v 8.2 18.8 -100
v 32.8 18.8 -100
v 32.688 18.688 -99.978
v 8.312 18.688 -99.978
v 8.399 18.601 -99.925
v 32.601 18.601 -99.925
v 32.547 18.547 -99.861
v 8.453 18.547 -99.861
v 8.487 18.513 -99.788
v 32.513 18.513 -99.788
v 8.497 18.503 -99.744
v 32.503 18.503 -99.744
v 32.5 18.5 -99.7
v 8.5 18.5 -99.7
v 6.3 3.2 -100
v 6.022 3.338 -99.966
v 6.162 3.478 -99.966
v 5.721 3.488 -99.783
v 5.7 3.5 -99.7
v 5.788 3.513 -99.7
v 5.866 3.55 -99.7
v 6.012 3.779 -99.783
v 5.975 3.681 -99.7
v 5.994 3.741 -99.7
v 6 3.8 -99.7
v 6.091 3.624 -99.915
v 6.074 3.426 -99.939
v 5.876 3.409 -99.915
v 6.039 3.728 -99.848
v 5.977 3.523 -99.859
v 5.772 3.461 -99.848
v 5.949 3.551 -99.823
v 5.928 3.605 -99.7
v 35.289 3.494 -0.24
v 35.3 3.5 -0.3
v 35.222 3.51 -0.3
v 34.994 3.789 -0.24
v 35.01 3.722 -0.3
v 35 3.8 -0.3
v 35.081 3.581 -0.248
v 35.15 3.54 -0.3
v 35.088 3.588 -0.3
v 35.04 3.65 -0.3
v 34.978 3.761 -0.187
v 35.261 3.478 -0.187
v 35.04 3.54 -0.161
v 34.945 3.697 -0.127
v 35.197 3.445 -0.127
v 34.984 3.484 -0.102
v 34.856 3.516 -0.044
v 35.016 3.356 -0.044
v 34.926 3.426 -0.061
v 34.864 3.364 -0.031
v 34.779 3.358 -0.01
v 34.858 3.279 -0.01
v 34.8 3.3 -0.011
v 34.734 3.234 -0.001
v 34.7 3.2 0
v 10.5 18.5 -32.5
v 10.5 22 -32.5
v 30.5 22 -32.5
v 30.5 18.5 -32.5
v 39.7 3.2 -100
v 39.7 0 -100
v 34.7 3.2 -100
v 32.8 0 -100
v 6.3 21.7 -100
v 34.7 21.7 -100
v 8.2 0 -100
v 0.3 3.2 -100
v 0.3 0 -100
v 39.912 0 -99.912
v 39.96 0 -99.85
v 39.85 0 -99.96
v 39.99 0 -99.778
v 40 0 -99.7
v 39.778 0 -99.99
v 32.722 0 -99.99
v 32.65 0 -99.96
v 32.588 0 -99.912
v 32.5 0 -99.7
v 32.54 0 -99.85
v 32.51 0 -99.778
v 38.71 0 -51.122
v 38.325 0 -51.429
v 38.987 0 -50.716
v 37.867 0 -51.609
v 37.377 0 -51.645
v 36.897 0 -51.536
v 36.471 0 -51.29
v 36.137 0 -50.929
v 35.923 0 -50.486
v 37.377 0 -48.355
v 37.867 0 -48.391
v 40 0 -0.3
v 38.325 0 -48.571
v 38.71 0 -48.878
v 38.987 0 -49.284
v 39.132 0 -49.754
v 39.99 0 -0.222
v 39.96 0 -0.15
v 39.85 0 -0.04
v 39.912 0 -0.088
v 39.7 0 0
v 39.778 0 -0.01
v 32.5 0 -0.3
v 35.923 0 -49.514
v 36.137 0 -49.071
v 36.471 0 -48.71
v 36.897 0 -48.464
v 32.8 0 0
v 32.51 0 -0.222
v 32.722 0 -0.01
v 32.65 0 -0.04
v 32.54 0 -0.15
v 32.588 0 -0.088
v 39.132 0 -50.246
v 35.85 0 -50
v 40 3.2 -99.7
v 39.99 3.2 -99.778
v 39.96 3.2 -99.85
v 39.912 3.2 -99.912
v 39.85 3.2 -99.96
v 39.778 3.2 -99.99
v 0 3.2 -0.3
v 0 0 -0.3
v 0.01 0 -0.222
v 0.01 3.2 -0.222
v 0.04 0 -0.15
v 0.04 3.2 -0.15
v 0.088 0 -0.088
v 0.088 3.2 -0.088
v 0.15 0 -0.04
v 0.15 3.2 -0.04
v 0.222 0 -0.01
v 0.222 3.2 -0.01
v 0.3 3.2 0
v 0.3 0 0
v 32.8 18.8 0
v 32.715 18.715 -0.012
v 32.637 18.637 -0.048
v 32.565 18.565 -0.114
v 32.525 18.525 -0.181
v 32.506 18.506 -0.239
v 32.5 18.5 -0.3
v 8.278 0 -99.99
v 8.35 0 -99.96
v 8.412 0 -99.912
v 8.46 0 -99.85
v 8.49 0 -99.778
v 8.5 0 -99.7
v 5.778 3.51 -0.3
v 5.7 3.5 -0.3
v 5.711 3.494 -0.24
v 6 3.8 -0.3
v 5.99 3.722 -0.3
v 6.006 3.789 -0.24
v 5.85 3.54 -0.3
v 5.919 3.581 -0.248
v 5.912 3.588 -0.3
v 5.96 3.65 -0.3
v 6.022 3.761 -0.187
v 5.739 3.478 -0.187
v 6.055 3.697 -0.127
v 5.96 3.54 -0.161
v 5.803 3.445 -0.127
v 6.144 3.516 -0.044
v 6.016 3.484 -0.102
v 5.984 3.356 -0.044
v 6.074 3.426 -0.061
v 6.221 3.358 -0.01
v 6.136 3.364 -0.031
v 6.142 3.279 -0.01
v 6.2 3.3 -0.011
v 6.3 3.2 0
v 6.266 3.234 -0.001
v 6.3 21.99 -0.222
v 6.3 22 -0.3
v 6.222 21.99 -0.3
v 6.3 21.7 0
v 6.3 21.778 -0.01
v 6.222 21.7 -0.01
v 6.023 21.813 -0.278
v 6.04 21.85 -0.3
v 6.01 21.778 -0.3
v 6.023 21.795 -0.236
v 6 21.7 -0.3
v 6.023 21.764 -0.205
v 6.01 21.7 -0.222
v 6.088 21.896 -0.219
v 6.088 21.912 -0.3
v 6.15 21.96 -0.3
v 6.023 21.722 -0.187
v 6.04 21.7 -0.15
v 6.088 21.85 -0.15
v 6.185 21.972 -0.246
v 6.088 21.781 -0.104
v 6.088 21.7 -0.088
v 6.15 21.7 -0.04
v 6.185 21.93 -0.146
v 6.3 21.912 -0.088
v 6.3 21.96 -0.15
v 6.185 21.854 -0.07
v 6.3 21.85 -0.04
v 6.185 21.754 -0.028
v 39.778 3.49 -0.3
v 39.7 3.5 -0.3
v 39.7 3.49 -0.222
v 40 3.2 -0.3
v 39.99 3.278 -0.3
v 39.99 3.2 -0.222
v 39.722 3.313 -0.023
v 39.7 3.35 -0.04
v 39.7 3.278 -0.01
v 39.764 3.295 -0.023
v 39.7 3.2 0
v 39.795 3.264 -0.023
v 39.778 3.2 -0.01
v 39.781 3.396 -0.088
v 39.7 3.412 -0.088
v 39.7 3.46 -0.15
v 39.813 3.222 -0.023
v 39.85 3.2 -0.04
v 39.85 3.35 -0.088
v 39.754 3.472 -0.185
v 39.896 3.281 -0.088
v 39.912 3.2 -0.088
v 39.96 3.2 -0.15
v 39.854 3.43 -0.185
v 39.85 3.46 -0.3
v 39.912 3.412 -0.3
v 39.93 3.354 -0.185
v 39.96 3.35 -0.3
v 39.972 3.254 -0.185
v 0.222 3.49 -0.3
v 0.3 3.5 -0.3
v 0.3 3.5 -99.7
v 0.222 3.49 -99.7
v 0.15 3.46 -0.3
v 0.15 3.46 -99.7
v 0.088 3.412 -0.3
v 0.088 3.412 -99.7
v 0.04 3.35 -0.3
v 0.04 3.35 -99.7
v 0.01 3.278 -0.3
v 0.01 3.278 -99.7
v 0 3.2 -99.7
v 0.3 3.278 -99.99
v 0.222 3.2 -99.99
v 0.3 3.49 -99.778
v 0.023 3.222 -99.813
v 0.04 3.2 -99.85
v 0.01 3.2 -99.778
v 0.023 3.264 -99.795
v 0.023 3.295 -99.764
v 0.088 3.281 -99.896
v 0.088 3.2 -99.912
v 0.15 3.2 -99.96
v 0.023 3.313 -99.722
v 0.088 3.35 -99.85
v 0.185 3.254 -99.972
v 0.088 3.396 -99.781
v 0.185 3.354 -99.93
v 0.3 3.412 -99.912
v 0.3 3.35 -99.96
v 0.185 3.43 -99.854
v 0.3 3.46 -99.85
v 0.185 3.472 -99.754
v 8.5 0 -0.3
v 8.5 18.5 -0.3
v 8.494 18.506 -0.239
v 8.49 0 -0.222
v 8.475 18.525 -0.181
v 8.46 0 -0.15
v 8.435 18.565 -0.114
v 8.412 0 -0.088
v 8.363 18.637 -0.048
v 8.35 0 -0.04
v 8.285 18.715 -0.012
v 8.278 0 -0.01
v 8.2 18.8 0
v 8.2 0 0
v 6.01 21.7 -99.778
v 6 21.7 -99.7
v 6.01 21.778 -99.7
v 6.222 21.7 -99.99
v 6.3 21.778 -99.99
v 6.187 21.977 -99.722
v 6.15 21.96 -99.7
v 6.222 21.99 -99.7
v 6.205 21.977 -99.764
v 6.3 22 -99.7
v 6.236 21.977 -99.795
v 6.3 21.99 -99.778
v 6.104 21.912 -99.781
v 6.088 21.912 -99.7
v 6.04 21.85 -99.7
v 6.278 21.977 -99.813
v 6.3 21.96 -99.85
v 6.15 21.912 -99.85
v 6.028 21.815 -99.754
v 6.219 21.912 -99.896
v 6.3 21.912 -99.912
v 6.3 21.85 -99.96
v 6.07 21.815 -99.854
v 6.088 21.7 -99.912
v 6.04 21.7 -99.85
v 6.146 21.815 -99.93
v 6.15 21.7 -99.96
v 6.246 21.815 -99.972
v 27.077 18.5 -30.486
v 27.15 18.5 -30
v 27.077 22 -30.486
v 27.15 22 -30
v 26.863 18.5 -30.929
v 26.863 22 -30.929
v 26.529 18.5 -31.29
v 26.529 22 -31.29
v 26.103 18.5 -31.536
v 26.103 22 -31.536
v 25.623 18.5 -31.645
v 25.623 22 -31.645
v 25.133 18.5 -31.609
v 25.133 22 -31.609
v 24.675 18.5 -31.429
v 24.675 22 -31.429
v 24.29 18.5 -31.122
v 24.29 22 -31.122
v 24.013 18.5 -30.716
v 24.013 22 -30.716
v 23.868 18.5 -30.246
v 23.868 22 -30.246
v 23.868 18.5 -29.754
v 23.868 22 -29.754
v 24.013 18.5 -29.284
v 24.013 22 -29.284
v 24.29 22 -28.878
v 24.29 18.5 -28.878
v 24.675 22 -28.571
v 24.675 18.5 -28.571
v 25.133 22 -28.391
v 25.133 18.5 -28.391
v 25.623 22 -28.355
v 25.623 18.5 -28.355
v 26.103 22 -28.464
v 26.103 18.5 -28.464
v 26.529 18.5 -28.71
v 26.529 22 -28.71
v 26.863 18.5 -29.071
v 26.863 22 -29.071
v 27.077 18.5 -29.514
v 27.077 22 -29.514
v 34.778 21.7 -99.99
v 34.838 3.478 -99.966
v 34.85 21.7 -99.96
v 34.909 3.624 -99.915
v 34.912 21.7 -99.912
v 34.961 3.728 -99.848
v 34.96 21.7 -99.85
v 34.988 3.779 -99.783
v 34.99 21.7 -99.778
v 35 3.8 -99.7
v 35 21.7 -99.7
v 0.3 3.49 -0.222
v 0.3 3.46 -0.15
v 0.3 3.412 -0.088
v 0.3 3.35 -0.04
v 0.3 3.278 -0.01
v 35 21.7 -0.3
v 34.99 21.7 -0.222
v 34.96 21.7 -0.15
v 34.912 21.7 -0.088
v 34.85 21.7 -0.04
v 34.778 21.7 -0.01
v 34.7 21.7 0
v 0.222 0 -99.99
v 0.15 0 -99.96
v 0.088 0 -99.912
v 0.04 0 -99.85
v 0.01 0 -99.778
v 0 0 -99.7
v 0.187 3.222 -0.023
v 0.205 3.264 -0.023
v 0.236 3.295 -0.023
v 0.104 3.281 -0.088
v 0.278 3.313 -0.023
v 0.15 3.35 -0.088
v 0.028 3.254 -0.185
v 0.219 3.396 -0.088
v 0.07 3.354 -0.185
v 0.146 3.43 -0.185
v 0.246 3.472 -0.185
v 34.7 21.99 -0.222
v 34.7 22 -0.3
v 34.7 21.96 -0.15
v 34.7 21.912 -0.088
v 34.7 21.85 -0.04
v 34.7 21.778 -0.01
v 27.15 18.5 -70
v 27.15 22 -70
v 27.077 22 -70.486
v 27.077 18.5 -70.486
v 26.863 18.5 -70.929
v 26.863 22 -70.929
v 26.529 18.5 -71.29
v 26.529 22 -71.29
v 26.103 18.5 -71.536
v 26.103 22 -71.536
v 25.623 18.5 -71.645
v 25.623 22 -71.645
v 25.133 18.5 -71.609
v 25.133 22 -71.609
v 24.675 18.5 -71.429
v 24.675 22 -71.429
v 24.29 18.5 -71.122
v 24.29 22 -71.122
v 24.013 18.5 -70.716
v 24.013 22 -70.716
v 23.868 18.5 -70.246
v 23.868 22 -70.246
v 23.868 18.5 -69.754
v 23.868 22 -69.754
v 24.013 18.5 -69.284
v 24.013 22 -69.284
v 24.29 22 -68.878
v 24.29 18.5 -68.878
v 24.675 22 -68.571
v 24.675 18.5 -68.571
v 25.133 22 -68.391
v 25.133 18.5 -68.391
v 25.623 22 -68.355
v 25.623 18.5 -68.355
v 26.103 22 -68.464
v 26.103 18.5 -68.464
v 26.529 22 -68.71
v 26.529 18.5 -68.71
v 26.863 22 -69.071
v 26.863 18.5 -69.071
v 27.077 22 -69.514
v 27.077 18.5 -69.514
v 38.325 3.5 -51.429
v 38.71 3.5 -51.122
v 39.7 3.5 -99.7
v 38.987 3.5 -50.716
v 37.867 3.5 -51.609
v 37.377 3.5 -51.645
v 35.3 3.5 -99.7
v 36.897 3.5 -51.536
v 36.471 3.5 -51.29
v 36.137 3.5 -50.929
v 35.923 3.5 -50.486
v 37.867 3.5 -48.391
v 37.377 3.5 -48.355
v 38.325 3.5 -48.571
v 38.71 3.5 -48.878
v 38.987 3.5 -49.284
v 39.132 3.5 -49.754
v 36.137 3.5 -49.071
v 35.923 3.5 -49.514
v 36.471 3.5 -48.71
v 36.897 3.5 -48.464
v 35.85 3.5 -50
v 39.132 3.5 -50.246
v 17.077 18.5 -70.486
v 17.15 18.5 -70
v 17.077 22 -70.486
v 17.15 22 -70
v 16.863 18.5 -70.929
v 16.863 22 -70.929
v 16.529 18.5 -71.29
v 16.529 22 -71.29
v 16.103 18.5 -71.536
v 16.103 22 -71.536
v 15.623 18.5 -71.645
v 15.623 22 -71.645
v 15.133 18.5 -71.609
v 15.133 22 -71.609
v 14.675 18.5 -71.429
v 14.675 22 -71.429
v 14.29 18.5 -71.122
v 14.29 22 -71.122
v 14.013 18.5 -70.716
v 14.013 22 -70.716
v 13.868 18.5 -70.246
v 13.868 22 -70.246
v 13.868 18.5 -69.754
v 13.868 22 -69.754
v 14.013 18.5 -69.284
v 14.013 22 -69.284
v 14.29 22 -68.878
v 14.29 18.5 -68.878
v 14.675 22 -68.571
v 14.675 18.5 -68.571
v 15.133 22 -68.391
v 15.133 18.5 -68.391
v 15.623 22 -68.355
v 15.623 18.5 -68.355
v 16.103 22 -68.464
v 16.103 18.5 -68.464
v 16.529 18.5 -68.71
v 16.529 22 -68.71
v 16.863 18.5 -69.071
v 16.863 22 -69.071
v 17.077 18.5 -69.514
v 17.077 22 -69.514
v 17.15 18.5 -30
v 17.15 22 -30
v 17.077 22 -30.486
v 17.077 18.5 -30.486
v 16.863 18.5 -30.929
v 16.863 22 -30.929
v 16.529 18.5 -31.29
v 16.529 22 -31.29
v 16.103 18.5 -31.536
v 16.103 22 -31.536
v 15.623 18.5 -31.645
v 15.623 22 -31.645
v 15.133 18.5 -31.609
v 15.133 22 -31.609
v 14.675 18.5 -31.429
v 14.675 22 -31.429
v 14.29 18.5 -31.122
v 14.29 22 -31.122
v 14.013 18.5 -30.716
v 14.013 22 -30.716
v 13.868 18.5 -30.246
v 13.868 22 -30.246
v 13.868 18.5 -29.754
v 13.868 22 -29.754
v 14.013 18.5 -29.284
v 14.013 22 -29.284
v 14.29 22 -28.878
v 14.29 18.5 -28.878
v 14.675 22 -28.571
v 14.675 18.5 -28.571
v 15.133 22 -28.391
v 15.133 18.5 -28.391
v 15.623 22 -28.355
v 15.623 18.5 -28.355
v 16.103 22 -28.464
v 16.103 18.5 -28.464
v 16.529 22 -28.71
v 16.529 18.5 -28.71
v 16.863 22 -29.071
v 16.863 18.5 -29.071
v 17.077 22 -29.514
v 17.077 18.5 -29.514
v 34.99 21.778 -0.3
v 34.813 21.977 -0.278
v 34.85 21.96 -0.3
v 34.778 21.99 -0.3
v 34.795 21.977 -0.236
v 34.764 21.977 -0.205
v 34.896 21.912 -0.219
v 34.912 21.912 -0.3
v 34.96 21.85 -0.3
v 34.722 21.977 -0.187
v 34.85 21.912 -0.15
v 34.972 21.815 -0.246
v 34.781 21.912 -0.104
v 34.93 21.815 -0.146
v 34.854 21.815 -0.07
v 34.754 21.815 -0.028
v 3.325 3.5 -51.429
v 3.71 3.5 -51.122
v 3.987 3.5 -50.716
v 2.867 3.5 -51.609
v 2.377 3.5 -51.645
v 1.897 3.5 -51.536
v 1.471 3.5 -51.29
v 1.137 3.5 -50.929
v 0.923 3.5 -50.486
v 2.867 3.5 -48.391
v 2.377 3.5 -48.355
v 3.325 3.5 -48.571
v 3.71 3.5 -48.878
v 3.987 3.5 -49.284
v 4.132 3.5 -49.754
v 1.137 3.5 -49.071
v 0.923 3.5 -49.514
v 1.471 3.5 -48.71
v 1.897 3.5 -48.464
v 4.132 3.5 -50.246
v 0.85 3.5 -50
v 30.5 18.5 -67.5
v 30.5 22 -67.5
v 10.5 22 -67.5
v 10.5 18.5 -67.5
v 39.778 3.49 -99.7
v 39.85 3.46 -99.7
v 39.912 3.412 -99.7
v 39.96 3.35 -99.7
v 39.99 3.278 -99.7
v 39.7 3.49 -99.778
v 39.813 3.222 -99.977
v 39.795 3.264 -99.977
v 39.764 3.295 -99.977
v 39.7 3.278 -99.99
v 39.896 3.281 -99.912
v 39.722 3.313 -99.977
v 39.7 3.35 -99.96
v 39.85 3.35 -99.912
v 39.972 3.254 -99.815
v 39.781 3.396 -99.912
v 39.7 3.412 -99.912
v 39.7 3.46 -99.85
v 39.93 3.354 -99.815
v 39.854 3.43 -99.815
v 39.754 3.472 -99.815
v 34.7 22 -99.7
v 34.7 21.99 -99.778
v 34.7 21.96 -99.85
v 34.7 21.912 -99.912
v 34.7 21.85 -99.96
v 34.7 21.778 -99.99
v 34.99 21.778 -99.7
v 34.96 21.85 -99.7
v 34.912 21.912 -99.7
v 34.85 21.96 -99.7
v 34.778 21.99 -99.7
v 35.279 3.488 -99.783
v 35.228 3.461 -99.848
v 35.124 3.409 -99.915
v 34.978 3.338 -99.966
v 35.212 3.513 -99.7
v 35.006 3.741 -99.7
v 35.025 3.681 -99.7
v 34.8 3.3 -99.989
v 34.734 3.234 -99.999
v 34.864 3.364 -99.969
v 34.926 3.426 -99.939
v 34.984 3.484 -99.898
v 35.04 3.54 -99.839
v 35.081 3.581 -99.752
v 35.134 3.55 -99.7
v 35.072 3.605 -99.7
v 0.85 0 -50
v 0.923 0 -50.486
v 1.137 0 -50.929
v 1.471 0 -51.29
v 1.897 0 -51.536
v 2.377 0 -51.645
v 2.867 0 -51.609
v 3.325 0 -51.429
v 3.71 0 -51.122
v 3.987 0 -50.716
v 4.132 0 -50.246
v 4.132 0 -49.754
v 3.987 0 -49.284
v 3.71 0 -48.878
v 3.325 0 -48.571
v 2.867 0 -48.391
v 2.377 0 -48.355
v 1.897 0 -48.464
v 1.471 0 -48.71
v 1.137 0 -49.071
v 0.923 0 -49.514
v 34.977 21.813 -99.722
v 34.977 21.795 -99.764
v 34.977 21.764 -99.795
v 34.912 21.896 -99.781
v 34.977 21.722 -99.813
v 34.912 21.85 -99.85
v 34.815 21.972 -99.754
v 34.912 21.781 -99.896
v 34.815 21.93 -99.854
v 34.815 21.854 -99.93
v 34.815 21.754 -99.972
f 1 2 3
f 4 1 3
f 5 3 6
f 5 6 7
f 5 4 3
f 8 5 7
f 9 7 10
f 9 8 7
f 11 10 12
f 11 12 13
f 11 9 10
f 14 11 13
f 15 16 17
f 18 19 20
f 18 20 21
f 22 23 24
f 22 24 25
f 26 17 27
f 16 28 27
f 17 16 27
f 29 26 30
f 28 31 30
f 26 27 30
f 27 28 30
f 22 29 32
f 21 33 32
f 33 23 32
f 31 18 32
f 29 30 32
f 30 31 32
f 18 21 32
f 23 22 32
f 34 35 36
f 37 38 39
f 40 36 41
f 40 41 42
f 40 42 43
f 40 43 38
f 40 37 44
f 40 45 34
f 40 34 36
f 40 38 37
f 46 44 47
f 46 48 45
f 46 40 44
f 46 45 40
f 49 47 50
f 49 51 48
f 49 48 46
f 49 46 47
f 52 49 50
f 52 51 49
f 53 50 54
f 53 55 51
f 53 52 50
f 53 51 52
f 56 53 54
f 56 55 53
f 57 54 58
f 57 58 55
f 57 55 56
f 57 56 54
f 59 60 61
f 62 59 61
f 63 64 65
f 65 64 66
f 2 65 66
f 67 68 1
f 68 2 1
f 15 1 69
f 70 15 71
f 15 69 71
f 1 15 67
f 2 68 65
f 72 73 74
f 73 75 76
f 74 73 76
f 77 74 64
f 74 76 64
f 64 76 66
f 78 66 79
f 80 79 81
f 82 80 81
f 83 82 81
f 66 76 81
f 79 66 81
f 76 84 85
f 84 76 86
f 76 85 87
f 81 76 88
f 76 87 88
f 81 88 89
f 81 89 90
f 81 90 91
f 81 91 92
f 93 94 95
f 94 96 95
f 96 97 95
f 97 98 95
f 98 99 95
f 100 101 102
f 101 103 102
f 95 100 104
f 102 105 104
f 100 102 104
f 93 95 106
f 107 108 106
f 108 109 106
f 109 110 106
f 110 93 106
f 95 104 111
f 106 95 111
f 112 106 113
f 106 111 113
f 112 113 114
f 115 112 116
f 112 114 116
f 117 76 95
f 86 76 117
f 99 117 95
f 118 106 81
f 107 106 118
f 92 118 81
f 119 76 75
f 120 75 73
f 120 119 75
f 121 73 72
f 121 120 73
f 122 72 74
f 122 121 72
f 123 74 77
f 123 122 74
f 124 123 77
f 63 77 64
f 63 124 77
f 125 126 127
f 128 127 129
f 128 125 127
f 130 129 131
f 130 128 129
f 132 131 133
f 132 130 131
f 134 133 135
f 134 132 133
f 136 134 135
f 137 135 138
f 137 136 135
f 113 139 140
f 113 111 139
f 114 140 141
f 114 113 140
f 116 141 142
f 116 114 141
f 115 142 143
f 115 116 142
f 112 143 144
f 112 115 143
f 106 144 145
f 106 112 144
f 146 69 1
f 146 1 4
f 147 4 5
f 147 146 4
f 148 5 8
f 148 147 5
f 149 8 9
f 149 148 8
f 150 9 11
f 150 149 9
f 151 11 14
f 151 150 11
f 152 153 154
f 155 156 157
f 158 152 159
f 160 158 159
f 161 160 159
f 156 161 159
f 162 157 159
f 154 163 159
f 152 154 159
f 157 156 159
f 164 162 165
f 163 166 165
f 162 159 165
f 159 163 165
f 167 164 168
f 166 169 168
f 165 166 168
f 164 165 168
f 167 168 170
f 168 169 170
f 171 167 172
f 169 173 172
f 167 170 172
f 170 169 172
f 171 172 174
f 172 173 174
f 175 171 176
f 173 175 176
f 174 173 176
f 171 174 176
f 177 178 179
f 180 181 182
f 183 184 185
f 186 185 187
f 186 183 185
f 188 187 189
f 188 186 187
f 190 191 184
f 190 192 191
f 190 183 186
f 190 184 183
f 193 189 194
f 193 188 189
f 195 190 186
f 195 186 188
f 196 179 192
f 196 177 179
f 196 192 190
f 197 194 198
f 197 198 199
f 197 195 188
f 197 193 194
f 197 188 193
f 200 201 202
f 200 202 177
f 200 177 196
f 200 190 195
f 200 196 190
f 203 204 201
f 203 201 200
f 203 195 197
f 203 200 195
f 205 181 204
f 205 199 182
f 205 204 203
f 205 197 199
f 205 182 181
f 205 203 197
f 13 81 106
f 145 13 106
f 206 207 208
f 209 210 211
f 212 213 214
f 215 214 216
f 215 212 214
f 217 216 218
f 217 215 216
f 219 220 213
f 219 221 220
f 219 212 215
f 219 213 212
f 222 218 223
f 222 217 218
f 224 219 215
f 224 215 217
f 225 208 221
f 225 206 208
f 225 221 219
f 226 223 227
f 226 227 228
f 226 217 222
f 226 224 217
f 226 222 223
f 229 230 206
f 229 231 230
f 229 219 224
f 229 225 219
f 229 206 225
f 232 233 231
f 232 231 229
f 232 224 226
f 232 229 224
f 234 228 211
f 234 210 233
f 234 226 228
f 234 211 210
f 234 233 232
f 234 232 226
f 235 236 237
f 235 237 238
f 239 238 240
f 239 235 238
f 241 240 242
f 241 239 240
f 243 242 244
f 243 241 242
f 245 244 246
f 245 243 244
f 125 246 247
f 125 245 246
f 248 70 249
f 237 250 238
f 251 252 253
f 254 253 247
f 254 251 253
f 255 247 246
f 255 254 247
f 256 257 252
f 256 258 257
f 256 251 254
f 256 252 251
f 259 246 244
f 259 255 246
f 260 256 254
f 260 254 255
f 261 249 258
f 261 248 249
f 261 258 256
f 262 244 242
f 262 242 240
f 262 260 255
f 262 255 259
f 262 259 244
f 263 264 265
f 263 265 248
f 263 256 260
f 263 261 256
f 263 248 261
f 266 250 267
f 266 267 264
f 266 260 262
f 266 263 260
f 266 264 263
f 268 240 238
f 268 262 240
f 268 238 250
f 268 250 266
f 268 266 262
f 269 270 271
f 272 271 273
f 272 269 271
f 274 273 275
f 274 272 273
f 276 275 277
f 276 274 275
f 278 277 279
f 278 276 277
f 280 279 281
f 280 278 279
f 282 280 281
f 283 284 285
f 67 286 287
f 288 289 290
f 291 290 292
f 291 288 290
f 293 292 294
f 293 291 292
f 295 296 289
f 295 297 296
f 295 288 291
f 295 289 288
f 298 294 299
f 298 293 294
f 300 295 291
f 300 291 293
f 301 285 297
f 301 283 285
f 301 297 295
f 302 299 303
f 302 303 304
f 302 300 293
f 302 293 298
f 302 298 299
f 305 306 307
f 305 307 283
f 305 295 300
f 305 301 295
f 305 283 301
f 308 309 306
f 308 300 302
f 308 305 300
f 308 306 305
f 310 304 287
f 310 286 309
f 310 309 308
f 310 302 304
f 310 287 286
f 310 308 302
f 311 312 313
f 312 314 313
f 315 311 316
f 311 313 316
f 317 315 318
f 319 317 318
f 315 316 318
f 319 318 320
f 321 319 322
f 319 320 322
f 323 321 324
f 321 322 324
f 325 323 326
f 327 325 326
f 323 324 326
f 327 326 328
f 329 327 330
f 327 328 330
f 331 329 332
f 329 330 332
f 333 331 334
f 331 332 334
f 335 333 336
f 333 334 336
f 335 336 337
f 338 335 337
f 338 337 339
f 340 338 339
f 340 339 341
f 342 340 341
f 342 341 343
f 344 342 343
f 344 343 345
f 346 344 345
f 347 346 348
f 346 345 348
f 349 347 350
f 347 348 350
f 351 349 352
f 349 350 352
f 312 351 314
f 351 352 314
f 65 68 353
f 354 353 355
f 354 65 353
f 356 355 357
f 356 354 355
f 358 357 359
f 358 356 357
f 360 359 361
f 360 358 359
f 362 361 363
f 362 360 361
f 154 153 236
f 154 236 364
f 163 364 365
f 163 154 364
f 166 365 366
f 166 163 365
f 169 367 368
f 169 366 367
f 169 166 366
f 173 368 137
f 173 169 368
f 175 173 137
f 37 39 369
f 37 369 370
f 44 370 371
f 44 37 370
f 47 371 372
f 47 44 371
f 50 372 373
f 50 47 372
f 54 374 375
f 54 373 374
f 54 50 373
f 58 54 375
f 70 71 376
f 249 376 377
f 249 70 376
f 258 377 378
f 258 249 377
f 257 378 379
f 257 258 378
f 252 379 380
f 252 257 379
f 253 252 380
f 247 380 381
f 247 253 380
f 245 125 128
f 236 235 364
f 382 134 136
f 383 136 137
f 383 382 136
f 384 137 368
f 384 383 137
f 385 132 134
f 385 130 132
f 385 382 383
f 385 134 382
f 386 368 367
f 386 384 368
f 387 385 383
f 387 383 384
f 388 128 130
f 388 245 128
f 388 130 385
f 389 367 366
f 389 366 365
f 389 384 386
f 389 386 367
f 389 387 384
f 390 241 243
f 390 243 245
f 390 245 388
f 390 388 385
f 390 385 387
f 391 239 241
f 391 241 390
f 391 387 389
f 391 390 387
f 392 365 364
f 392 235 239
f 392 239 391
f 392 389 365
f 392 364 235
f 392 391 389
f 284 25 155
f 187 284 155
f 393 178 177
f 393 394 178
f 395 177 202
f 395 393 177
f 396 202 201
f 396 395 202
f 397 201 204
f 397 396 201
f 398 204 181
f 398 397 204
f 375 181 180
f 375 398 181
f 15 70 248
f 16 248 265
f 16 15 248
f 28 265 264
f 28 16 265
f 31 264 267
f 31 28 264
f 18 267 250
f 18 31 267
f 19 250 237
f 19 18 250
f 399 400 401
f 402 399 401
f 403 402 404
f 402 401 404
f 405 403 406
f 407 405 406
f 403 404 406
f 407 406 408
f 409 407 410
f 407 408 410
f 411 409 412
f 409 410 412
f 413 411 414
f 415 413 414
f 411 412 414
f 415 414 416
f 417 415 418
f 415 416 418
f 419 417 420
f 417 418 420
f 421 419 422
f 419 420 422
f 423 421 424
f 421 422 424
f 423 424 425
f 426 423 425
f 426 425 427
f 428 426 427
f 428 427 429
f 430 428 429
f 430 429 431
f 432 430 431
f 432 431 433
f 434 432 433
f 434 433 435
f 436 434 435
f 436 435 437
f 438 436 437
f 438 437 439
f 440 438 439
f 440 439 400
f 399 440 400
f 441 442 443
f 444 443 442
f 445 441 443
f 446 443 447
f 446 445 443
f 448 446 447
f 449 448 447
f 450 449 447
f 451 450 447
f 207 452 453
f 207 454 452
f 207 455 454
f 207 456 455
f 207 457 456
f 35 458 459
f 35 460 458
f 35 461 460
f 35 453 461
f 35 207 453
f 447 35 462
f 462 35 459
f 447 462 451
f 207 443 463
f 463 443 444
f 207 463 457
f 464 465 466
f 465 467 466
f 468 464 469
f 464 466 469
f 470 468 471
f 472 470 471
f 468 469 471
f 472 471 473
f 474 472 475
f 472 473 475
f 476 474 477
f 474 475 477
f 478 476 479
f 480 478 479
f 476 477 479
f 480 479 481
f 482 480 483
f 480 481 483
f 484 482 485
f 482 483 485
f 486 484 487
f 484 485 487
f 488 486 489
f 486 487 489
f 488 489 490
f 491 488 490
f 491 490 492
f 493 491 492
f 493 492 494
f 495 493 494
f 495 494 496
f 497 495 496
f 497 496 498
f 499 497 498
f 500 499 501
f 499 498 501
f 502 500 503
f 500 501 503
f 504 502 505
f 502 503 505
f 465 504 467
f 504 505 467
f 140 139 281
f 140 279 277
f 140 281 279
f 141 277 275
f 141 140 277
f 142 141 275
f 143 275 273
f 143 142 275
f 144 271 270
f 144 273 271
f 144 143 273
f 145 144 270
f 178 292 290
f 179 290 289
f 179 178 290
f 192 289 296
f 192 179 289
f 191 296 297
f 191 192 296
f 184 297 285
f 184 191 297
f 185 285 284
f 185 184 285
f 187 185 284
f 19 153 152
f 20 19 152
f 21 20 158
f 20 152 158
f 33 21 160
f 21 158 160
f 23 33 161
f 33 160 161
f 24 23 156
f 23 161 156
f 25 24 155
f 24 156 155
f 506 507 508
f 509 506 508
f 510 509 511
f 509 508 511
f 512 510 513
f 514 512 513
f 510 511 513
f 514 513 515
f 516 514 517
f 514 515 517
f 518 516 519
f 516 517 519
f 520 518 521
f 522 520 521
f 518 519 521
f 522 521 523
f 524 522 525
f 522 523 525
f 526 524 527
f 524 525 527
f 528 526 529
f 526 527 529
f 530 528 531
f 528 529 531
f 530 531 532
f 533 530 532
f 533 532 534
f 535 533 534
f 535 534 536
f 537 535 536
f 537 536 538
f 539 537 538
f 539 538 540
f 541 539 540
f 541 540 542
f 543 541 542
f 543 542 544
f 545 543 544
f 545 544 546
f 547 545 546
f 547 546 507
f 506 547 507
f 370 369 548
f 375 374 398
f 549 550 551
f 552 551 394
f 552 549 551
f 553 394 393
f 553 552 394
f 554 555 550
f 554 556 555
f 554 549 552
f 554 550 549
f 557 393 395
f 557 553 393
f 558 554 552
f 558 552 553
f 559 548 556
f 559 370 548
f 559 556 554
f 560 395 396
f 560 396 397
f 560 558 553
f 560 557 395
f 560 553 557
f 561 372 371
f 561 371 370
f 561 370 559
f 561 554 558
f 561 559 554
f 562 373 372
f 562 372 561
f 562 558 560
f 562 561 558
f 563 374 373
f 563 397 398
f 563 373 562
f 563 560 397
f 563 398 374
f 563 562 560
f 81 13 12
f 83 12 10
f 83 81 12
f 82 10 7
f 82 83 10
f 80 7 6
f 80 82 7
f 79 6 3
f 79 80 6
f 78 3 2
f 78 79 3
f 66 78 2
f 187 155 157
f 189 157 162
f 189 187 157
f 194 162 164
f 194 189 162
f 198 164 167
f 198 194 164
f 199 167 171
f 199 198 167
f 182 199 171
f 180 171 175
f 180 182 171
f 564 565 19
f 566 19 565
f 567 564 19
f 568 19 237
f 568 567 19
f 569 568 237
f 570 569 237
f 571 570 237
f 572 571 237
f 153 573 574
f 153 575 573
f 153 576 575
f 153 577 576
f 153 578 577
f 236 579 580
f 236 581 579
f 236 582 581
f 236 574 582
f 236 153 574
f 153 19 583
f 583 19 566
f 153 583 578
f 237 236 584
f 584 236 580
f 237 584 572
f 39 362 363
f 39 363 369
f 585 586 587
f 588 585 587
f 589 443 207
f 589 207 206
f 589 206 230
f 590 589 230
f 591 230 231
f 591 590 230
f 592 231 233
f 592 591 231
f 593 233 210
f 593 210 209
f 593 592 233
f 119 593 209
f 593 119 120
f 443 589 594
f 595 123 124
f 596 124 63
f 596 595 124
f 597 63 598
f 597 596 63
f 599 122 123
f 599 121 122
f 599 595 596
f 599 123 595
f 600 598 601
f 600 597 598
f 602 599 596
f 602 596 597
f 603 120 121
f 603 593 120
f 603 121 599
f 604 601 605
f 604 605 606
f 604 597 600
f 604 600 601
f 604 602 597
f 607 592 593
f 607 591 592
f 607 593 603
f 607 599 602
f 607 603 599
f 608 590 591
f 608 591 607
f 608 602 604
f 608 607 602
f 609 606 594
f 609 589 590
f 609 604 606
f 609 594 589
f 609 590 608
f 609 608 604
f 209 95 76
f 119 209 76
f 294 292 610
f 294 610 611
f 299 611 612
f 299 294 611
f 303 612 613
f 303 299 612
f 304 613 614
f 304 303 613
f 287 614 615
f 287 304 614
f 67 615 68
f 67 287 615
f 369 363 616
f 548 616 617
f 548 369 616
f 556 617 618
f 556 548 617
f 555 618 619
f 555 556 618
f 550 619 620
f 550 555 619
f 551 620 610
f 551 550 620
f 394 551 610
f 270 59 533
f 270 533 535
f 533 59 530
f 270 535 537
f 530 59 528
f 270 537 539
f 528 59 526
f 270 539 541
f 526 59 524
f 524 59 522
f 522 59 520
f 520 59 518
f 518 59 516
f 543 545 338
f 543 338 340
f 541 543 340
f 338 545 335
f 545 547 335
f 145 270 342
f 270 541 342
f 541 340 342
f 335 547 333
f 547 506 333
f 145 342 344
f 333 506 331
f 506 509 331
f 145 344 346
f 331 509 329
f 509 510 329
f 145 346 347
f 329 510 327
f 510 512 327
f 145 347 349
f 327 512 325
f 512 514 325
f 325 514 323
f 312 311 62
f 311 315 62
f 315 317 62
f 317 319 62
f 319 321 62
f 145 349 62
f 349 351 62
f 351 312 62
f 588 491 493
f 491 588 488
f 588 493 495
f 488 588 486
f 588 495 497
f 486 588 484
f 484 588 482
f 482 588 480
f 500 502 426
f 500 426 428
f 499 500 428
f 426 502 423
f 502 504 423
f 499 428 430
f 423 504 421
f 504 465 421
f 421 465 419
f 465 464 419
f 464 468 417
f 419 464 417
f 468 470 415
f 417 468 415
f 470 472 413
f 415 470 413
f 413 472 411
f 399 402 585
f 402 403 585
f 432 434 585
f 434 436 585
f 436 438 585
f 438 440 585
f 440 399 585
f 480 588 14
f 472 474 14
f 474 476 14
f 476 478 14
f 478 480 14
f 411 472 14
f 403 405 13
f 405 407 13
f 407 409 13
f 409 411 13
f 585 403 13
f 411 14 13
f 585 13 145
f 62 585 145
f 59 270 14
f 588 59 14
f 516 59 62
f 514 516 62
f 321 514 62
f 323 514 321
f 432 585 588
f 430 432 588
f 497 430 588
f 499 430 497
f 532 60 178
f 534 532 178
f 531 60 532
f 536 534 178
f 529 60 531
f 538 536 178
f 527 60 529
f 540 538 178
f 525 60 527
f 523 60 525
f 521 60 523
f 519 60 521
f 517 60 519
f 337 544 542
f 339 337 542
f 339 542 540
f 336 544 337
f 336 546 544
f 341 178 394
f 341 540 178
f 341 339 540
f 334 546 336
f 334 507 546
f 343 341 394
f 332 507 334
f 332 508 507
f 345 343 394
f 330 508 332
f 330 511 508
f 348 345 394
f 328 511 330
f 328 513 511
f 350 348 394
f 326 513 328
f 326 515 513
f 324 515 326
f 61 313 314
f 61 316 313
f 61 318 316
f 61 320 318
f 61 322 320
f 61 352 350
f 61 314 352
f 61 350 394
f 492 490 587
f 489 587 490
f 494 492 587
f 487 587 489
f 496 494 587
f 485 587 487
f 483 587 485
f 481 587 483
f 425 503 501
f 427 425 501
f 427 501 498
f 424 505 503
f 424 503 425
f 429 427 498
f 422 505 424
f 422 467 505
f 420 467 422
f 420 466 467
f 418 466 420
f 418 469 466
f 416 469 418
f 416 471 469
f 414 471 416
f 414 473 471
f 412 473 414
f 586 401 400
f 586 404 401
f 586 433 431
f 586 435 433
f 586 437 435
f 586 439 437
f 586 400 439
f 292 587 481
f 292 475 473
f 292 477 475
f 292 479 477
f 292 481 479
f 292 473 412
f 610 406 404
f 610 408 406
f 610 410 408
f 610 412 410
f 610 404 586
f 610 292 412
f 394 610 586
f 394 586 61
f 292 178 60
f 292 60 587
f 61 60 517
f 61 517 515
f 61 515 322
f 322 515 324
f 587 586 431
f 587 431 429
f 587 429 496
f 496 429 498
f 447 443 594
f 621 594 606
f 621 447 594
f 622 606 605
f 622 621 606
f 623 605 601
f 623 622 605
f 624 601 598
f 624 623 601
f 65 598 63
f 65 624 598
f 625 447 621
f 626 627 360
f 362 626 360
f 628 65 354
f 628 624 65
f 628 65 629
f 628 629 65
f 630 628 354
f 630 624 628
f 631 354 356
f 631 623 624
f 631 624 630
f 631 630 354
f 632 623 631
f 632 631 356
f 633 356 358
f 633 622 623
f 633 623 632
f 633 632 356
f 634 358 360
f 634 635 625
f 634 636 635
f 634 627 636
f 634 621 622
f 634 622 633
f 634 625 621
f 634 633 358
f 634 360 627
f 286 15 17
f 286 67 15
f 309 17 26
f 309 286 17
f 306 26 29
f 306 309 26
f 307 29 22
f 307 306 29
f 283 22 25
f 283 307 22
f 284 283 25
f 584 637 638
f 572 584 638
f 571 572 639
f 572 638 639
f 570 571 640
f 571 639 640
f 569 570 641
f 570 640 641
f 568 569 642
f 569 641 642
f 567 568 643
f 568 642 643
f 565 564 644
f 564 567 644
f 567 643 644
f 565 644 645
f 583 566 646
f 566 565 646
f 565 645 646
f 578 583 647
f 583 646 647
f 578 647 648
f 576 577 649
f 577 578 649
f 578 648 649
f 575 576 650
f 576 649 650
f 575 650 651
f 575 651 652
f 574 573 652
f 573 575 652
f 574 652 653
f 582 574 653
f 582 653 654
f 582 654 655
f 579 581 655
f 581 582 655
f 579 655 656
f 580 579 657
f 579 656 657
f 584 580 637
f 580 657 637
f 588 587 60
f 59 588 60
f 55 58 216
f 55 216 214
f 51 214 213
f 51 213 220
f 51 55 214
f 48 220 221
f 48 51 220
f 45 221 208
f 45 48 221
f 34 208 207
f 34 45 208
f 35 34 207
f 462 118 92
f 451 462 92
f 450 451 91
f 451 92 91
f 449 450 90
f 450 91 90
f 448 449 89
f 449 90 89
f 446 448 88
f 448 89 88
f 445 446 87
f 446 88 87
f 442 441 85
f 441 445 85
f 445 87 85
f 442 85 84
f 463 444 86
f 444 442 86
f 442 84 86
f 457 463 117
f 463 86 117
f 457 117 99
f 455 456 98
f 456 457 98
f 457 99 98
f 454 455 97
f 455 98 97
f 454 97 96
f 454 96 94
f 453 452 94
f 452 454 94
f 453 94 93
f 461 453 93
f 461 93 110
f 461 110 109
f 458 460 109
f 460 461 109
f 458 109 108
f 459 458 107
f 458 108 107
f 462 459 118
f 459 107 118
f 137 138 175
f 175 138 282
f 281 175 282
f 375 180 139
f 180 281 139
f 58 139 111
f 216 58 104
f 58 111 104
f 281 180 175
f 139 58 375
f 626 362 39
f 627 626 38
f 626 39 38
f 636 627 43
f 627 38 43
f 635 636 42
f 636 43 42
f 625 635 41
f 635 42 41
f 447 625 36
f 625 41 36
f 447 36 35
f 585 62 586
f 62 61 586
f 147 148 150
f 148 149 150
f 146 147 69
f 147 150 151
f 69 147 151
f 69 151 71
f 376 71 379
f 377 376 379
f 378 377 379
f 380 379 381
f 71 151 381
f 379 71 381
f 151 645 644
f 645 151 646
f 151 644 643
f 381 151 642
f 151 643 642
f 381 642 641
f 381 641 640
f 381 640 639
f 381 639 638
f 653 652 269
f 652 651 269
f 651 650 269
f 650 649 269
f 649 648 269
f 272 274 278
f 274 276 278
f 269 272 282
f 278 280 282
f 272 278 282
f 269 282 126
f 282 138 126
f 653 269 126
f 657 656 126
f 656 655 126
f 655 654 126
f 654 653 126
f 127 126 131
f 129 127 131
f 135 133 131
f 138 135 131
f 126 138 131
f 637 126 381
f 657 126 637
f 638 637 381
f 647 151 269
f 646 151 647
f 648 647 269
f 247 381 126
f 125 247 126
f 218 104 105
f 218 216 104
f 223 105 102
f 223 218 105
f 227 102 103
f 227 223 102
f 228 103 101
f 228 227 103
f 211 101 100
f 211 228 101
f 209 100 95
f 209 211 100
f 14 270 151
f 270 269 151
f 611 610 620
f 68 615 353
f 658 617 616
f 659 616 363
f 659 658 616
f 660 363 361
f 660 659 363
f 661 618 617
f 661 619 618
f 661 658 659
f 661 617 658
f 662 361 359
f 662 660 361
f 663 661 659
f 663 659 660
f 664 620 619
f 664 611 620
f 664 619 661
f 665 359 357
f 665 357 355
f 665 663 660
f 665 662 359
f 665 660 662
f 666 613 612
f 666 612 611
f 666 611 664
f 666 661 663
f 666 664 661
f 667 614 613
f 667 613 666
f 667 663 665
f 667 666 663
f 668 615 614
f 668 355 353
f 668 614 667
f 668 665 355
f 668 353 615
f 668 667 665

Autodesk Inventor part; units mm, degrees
ref_plane "YZ Plane" through (0, 0, 0) normal (1, 0, 0) x (0, 1, 0)
ref_plane "XZ Plane" through (0, 0, 0) normal (0, 1, 0) x (-1, 0, 0)
ref_plane "XY Plane" through (0, 0, 0) normal (0, 0, 1) x (1, 0, 0)
sketch "Sketch1" plane through (0, 0, 0) normal (0, 1, 0) x (-1, 0, 0)
  line L0 (-40, 0) -> (-40, -100)
  line L1 (0, -100) -> (0, 0)
  line L2 (-35, 0) -> (-35, -100)
  line L3 (-6, -100) -> (-6, 0)
  circle A0 centre (-2.5, -50) radius 1.65
  circle A1 centre (-37.5, -50) radius 1.65
  line L4 (0, 0) -> (-8.5, 0)
  line L5 (-32.5, 0) -> (-40, 0)
  line L6 (-40, -100) -> (-32.5, -100)
  line L7 (-8.5, -100) -> (0, -100)
  line L8 (-8.5, 0) -> (-8.5, -100)
  line L9 (-32.5, -100) -> (-32.5, 0)
  dimension "d4" = 3.3
  dimension "d5" = 3.3
  dimension "d8" = 2.5
  dimension "d9" = 2.5
extrude "Extrusion1" add sketch "Sketch1" along normal blind 3.5
sketch "Sketch2" plane through (0, 3.5, 0) normal (0, 1, 0) x (1, 0, 0)
  line L0 (8.5, 100) -> (0, 100) projected
  line L1 (8.5, 100) -> (6, 100)
  line L2 (6, 100) -> (6, 0)
  line L3 (6, 0) -> (8.5, 0)
  line L4 (8.5, 0) -> (8.5, 100)
  line L5 (32.5, 100) -> (32.5, 0) projected
  line L6 (32.5, 100) -> (35, 100)
  line L7 (35, 100) -> (35, 0)
  line L8 (35, 0) -> (32.5, 0)
  line L9 (32.5, 0) -> (32.5, 100)
  point P0 (0, 0)
  point P1 (32.5, 0)
  point P2 (6, 100)
  dimension "d10" = 2.5
  dimension "d11" = 100
  dimension "d12" = 2.5
  dimension "d13" = 100
extrude "Extrusion2" add sketch "Sketch2" along normal blind 15
sketch "Sketch3" plane through (0, 18.5, 0) normal (0, 1, 0) x (1, 0, 0)
  line L0 (6, 100) -> (6, 0) projected
  line L1 (35, 100) -> (35, 0) projected
  line L2 (6, 0) -> (35, 0)
  line L3 (35, 0) -> (35, 100)
  line L4 (35, 100) -> (6, 100)
  line L5 (6, 100) -> (6, 0)
  point P0 (0, 0)
  point P1 (35, 0)
  point P2 (6, 100)
extrude "Extrusion3" add sketch "Sketch3" along normal blind 3.5
sketch "Sketch4" plane through (0, 22, 0) normal (0, 1, 0) x (1, 0, 0)
  circle A0 centre (15.5, 70) radius 1.65
  circle A1 centre (25.5, 70) radius 1.65
  circle A2 centre (15.5, 30) radius 1.65
  circle A3 centre (25.5, 30) radius 1.65
  line L0 (30.5, 67.5) -> (10.5, 67.5)
  line L1 (10.5, 67.5) -> (10.5, 32.5)
  line L2 (10.5, 32.5) -> (30.5, 32.5)
  line L3 (30.5, 32.5) -> (30.5, 67.5)
  dimension "d36" = 20
  dimension "d37" = 35
extrude "Extrusion4" cut sketch "Sketch4" against normal blind 3.5
fillet "Fillet1" radius 0.3 24 edges at (6, 12.75, -100) (3, 3.5, -100) (20.5, 22, -100) (8.5, 9.25, -100) (20.5, 18.5, -100) (35, 12.75, -100) (32.5, 9.25, -100) (32.5, 9.25, 0) (35, 12.75, 0) (20.5, 22, 0) (20.5, 18.5, 0) (8.5, 9.25, 0) (6, 12.75, 0) (6, 22, -50) (35, 22, -50) (0, 3.5, -50) (40, 3.5, -50) (37.5, 3.5, 0) (3, 3.5, 0) (0, 1.75, 0) (40, 1.75, 0) (40, 1.75, -100) (37.5, 3.5, -100) (0, 1.75, -100)
fillet "Fillet2" radius 0.3 6 edges at (6.0879, 3.4121, -99.9121) (6.0879, 3.4121, -0.0879) (6, 3.5, -50) (34.9121, 3.4121, -0.0879) (34.9121, 3.4121, -99.9121) (35, 3.5, -50)
properties part number "controllerHousing"
